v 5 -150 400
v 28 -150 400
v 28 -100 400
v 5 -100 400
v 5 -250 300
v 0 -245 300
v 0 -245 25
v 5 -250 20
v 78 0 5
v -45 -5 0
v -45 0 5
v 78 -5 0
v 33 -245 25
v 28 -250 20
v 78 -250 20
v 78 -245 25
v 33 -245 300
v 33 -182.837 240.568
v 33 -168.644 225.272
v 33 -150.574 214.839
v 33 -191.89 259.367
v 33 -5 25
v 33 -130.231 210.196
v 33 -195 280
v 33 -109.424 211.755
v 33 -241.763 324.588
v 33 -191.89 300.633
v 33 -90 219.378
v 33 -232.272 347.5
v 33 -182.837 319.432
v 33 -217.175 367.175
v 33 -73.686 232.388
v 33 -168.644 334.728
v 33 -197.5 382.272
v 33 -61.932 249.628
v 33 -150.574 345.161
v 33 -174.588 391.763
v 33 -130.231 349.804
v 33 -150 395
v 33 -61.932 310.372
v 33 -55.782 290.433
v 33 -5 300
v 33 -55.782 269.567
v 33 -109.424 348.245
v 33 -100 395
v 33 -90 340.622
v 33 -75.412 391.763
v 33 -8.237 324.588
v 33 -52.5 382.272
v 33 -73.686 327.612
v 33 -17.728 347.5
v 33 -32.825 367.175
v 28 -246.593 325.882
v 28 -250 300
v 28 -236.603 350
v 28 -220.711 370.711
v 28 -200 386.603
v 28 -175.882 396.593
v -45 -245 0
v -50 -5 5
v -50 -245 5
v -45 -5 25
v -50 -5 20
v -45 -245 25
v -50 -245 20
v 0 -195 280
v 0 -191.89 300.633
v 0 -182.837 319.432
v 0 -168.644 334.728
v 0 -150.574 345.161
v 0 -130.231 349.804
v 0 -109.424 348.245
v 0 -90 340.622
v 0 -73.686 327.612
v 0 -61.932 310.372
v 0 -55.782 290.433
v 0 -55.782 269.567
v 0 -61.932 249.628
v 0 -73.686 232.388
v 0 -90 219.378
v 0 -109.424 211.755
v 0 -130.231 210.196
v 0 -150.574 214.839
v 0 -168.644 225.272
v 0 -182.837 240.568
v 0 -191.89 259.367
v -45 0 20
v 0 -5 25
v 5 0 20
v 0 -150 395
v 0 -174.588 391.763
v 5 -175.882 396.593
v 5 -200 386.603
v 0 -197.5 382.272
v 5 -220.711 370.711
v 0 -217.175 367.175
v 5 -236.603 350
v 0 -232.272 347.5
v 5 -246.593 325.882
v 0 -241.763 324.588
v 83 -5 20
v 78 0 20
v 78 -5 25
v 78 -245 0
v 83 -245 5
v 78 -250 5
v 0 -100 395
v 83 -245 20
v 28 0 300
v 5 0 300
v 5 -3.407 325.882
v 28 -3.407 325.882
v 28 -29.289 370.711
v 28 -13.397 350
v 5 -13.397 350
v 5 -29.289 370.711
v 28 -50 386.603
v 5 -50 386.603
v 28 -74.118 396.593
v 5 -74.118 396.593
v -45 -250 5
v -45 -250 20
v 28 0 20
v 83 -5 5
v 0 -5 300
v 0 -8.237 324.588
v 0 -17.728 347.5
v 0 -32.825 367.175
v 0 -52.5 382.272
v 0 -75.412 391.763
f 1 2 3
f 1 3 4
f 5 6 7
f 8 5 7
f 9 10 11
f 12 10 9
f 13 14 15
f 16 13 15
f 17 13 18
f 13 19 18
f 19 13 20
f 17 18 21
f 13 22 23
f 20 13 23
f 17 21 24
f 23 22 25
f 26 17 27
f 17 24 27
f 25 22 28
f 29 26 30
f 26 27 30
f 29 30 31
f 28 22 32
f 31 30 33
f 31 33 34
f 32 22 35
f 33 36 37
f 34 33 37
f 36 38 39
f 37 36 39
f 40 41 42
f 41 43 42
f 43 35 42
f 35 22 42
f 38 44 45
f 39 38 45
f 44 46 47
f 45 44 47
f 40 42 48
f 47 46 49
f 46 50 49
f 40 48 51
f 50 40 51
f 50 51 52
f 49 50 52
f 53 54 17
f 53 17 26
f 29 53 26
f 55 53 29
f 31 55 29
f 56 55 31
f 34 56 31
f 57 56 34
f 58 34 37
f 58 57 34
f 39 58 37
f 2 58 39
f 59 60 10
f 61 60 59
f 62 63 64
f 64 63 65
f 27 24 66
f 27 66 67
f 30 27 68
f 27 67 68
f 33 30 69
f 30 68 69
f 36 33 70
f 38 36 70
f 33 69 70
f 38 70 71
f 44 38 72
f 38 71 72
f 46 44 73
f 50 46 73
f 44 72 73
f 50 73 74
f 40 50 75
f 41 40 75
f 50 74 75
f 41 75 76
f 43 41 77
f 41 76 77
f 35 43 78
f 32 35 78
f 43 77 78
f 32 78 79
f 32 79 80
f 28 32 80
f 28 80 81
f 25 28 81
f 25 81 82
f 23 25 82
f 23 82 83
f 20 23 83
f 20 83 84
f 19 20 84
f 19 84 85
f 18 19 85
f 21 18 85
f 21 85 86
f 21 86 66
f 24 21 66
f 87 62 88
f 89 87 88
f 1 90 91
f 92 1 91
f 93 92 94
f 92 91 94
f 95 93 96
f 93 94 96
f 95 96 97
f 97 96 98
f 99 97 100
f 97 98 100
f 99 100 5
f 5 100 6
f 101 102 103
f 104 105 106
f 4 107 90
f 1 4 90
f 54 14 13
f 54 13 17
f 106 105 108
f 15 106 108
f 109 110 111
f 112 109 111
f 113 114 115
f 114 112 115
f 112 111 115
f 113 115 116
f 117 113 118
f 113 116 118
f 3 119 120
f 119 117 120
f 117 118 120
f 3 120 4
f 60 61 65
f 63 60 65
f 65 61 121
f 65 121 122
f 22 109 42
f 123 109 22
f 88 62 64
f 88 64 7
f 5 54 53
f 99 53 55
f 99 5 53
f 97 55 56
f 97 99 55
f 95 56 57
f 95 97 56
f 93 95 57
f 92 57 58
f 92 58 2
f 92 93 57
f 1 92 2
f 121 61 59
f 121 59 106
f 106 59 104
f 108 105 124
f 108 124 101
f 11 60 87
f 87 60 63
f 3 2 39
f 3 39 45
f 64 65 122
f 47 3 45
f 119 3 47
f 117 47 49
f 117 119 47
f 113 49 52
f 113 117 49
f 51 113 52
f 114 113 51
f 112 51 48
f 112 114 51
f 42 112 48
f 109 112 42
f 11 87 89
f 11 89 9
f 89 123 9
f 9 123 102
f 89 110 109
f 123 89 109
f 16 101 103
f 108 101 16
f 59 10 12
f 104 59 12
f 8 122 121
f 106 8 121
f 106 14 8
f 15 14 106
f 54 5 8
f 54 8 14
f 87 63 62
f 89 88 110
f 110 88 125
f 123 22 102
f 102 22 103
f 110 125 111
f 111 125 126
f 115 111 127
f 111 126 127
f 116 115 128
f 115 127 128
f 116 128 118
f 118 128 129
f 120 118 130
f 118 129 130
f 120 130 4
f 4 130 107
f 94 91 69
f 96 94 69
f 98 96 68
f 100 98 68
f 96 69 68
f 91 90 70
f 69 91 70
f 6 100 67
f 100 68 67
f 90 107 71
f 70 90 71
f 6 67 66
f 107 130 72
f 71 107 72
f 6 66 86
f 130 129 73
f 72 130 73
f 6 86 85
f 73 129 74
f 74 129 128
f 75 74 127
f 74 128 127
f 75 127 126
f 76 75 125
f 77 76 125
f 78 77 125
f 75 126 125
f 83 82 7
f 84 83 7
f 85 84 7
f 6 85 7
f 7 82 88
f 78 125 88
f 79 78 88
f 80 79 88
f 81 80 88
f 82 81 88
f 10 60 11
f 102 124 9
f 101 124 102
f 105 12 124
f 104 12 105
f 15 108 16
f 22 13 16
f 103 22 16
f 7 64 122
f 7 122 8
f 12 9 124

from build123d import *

# Parameters (mm, degrees)
F0_W     = 50
F0_H     = 25
F1_DEPTH = 250
F3_D     = 140
F3_DEPTH = 60
F4_R     = 100
F5_SIZE  = 5


with BuildPart() as f1:
    # F0 (on Front) → F1 (new body)
    with BuildSketch(Plane.XZ):
        Polygon((0, 25), (0, 0), (33, 0), (33, 25), (33, 400), (0, 400), align=None)
        with Locations((-25, 12.5)):
            Rectangle(F0_W, F0_H)
        with Locations((58, 12.5)):
            Rectangle(F0_W, F0_H)
    extrude(amount=F1_DEPTH)

    # F3
    with Locations(Plane.YZ.offset(33)):
        with Locations((-125, 280)):
            Hole(F3_D / 2, depth=F3_DEPTH)

    # F4
    f4_edges = [f1.edges().sort_by_distance(p)[0] for p in [
        (16.5, 0, 400),
        (16.5, -250, 400),
    ]]
    fillet(f4_edges, radius=F4_R)

    # F5
    f5_edges = [f1.edges().sort_by_distance(p)[0] for p in [
        (-50, -125, 25),
        (-50, -125, 0),
        (-50, 0, 12.5),
        (-50, -250, 12.5),
        (-25, -250, 25),
        (0, -250, 162.5),
        (33, -250, 162.5),
        (-25, 0, 25),
        (16.5, 0, 0),
        (58, 0, 25),
        (83, 0, 12.5),
        (83, -125, 25),
        (83, -125, 0),
        (83, -250, 12.5),
        (58, -250, 25),
        (16.5, -250, 0),
    ]]
    chamfer(f5_edges, length=F5_SIZE)


solid = f1.part
